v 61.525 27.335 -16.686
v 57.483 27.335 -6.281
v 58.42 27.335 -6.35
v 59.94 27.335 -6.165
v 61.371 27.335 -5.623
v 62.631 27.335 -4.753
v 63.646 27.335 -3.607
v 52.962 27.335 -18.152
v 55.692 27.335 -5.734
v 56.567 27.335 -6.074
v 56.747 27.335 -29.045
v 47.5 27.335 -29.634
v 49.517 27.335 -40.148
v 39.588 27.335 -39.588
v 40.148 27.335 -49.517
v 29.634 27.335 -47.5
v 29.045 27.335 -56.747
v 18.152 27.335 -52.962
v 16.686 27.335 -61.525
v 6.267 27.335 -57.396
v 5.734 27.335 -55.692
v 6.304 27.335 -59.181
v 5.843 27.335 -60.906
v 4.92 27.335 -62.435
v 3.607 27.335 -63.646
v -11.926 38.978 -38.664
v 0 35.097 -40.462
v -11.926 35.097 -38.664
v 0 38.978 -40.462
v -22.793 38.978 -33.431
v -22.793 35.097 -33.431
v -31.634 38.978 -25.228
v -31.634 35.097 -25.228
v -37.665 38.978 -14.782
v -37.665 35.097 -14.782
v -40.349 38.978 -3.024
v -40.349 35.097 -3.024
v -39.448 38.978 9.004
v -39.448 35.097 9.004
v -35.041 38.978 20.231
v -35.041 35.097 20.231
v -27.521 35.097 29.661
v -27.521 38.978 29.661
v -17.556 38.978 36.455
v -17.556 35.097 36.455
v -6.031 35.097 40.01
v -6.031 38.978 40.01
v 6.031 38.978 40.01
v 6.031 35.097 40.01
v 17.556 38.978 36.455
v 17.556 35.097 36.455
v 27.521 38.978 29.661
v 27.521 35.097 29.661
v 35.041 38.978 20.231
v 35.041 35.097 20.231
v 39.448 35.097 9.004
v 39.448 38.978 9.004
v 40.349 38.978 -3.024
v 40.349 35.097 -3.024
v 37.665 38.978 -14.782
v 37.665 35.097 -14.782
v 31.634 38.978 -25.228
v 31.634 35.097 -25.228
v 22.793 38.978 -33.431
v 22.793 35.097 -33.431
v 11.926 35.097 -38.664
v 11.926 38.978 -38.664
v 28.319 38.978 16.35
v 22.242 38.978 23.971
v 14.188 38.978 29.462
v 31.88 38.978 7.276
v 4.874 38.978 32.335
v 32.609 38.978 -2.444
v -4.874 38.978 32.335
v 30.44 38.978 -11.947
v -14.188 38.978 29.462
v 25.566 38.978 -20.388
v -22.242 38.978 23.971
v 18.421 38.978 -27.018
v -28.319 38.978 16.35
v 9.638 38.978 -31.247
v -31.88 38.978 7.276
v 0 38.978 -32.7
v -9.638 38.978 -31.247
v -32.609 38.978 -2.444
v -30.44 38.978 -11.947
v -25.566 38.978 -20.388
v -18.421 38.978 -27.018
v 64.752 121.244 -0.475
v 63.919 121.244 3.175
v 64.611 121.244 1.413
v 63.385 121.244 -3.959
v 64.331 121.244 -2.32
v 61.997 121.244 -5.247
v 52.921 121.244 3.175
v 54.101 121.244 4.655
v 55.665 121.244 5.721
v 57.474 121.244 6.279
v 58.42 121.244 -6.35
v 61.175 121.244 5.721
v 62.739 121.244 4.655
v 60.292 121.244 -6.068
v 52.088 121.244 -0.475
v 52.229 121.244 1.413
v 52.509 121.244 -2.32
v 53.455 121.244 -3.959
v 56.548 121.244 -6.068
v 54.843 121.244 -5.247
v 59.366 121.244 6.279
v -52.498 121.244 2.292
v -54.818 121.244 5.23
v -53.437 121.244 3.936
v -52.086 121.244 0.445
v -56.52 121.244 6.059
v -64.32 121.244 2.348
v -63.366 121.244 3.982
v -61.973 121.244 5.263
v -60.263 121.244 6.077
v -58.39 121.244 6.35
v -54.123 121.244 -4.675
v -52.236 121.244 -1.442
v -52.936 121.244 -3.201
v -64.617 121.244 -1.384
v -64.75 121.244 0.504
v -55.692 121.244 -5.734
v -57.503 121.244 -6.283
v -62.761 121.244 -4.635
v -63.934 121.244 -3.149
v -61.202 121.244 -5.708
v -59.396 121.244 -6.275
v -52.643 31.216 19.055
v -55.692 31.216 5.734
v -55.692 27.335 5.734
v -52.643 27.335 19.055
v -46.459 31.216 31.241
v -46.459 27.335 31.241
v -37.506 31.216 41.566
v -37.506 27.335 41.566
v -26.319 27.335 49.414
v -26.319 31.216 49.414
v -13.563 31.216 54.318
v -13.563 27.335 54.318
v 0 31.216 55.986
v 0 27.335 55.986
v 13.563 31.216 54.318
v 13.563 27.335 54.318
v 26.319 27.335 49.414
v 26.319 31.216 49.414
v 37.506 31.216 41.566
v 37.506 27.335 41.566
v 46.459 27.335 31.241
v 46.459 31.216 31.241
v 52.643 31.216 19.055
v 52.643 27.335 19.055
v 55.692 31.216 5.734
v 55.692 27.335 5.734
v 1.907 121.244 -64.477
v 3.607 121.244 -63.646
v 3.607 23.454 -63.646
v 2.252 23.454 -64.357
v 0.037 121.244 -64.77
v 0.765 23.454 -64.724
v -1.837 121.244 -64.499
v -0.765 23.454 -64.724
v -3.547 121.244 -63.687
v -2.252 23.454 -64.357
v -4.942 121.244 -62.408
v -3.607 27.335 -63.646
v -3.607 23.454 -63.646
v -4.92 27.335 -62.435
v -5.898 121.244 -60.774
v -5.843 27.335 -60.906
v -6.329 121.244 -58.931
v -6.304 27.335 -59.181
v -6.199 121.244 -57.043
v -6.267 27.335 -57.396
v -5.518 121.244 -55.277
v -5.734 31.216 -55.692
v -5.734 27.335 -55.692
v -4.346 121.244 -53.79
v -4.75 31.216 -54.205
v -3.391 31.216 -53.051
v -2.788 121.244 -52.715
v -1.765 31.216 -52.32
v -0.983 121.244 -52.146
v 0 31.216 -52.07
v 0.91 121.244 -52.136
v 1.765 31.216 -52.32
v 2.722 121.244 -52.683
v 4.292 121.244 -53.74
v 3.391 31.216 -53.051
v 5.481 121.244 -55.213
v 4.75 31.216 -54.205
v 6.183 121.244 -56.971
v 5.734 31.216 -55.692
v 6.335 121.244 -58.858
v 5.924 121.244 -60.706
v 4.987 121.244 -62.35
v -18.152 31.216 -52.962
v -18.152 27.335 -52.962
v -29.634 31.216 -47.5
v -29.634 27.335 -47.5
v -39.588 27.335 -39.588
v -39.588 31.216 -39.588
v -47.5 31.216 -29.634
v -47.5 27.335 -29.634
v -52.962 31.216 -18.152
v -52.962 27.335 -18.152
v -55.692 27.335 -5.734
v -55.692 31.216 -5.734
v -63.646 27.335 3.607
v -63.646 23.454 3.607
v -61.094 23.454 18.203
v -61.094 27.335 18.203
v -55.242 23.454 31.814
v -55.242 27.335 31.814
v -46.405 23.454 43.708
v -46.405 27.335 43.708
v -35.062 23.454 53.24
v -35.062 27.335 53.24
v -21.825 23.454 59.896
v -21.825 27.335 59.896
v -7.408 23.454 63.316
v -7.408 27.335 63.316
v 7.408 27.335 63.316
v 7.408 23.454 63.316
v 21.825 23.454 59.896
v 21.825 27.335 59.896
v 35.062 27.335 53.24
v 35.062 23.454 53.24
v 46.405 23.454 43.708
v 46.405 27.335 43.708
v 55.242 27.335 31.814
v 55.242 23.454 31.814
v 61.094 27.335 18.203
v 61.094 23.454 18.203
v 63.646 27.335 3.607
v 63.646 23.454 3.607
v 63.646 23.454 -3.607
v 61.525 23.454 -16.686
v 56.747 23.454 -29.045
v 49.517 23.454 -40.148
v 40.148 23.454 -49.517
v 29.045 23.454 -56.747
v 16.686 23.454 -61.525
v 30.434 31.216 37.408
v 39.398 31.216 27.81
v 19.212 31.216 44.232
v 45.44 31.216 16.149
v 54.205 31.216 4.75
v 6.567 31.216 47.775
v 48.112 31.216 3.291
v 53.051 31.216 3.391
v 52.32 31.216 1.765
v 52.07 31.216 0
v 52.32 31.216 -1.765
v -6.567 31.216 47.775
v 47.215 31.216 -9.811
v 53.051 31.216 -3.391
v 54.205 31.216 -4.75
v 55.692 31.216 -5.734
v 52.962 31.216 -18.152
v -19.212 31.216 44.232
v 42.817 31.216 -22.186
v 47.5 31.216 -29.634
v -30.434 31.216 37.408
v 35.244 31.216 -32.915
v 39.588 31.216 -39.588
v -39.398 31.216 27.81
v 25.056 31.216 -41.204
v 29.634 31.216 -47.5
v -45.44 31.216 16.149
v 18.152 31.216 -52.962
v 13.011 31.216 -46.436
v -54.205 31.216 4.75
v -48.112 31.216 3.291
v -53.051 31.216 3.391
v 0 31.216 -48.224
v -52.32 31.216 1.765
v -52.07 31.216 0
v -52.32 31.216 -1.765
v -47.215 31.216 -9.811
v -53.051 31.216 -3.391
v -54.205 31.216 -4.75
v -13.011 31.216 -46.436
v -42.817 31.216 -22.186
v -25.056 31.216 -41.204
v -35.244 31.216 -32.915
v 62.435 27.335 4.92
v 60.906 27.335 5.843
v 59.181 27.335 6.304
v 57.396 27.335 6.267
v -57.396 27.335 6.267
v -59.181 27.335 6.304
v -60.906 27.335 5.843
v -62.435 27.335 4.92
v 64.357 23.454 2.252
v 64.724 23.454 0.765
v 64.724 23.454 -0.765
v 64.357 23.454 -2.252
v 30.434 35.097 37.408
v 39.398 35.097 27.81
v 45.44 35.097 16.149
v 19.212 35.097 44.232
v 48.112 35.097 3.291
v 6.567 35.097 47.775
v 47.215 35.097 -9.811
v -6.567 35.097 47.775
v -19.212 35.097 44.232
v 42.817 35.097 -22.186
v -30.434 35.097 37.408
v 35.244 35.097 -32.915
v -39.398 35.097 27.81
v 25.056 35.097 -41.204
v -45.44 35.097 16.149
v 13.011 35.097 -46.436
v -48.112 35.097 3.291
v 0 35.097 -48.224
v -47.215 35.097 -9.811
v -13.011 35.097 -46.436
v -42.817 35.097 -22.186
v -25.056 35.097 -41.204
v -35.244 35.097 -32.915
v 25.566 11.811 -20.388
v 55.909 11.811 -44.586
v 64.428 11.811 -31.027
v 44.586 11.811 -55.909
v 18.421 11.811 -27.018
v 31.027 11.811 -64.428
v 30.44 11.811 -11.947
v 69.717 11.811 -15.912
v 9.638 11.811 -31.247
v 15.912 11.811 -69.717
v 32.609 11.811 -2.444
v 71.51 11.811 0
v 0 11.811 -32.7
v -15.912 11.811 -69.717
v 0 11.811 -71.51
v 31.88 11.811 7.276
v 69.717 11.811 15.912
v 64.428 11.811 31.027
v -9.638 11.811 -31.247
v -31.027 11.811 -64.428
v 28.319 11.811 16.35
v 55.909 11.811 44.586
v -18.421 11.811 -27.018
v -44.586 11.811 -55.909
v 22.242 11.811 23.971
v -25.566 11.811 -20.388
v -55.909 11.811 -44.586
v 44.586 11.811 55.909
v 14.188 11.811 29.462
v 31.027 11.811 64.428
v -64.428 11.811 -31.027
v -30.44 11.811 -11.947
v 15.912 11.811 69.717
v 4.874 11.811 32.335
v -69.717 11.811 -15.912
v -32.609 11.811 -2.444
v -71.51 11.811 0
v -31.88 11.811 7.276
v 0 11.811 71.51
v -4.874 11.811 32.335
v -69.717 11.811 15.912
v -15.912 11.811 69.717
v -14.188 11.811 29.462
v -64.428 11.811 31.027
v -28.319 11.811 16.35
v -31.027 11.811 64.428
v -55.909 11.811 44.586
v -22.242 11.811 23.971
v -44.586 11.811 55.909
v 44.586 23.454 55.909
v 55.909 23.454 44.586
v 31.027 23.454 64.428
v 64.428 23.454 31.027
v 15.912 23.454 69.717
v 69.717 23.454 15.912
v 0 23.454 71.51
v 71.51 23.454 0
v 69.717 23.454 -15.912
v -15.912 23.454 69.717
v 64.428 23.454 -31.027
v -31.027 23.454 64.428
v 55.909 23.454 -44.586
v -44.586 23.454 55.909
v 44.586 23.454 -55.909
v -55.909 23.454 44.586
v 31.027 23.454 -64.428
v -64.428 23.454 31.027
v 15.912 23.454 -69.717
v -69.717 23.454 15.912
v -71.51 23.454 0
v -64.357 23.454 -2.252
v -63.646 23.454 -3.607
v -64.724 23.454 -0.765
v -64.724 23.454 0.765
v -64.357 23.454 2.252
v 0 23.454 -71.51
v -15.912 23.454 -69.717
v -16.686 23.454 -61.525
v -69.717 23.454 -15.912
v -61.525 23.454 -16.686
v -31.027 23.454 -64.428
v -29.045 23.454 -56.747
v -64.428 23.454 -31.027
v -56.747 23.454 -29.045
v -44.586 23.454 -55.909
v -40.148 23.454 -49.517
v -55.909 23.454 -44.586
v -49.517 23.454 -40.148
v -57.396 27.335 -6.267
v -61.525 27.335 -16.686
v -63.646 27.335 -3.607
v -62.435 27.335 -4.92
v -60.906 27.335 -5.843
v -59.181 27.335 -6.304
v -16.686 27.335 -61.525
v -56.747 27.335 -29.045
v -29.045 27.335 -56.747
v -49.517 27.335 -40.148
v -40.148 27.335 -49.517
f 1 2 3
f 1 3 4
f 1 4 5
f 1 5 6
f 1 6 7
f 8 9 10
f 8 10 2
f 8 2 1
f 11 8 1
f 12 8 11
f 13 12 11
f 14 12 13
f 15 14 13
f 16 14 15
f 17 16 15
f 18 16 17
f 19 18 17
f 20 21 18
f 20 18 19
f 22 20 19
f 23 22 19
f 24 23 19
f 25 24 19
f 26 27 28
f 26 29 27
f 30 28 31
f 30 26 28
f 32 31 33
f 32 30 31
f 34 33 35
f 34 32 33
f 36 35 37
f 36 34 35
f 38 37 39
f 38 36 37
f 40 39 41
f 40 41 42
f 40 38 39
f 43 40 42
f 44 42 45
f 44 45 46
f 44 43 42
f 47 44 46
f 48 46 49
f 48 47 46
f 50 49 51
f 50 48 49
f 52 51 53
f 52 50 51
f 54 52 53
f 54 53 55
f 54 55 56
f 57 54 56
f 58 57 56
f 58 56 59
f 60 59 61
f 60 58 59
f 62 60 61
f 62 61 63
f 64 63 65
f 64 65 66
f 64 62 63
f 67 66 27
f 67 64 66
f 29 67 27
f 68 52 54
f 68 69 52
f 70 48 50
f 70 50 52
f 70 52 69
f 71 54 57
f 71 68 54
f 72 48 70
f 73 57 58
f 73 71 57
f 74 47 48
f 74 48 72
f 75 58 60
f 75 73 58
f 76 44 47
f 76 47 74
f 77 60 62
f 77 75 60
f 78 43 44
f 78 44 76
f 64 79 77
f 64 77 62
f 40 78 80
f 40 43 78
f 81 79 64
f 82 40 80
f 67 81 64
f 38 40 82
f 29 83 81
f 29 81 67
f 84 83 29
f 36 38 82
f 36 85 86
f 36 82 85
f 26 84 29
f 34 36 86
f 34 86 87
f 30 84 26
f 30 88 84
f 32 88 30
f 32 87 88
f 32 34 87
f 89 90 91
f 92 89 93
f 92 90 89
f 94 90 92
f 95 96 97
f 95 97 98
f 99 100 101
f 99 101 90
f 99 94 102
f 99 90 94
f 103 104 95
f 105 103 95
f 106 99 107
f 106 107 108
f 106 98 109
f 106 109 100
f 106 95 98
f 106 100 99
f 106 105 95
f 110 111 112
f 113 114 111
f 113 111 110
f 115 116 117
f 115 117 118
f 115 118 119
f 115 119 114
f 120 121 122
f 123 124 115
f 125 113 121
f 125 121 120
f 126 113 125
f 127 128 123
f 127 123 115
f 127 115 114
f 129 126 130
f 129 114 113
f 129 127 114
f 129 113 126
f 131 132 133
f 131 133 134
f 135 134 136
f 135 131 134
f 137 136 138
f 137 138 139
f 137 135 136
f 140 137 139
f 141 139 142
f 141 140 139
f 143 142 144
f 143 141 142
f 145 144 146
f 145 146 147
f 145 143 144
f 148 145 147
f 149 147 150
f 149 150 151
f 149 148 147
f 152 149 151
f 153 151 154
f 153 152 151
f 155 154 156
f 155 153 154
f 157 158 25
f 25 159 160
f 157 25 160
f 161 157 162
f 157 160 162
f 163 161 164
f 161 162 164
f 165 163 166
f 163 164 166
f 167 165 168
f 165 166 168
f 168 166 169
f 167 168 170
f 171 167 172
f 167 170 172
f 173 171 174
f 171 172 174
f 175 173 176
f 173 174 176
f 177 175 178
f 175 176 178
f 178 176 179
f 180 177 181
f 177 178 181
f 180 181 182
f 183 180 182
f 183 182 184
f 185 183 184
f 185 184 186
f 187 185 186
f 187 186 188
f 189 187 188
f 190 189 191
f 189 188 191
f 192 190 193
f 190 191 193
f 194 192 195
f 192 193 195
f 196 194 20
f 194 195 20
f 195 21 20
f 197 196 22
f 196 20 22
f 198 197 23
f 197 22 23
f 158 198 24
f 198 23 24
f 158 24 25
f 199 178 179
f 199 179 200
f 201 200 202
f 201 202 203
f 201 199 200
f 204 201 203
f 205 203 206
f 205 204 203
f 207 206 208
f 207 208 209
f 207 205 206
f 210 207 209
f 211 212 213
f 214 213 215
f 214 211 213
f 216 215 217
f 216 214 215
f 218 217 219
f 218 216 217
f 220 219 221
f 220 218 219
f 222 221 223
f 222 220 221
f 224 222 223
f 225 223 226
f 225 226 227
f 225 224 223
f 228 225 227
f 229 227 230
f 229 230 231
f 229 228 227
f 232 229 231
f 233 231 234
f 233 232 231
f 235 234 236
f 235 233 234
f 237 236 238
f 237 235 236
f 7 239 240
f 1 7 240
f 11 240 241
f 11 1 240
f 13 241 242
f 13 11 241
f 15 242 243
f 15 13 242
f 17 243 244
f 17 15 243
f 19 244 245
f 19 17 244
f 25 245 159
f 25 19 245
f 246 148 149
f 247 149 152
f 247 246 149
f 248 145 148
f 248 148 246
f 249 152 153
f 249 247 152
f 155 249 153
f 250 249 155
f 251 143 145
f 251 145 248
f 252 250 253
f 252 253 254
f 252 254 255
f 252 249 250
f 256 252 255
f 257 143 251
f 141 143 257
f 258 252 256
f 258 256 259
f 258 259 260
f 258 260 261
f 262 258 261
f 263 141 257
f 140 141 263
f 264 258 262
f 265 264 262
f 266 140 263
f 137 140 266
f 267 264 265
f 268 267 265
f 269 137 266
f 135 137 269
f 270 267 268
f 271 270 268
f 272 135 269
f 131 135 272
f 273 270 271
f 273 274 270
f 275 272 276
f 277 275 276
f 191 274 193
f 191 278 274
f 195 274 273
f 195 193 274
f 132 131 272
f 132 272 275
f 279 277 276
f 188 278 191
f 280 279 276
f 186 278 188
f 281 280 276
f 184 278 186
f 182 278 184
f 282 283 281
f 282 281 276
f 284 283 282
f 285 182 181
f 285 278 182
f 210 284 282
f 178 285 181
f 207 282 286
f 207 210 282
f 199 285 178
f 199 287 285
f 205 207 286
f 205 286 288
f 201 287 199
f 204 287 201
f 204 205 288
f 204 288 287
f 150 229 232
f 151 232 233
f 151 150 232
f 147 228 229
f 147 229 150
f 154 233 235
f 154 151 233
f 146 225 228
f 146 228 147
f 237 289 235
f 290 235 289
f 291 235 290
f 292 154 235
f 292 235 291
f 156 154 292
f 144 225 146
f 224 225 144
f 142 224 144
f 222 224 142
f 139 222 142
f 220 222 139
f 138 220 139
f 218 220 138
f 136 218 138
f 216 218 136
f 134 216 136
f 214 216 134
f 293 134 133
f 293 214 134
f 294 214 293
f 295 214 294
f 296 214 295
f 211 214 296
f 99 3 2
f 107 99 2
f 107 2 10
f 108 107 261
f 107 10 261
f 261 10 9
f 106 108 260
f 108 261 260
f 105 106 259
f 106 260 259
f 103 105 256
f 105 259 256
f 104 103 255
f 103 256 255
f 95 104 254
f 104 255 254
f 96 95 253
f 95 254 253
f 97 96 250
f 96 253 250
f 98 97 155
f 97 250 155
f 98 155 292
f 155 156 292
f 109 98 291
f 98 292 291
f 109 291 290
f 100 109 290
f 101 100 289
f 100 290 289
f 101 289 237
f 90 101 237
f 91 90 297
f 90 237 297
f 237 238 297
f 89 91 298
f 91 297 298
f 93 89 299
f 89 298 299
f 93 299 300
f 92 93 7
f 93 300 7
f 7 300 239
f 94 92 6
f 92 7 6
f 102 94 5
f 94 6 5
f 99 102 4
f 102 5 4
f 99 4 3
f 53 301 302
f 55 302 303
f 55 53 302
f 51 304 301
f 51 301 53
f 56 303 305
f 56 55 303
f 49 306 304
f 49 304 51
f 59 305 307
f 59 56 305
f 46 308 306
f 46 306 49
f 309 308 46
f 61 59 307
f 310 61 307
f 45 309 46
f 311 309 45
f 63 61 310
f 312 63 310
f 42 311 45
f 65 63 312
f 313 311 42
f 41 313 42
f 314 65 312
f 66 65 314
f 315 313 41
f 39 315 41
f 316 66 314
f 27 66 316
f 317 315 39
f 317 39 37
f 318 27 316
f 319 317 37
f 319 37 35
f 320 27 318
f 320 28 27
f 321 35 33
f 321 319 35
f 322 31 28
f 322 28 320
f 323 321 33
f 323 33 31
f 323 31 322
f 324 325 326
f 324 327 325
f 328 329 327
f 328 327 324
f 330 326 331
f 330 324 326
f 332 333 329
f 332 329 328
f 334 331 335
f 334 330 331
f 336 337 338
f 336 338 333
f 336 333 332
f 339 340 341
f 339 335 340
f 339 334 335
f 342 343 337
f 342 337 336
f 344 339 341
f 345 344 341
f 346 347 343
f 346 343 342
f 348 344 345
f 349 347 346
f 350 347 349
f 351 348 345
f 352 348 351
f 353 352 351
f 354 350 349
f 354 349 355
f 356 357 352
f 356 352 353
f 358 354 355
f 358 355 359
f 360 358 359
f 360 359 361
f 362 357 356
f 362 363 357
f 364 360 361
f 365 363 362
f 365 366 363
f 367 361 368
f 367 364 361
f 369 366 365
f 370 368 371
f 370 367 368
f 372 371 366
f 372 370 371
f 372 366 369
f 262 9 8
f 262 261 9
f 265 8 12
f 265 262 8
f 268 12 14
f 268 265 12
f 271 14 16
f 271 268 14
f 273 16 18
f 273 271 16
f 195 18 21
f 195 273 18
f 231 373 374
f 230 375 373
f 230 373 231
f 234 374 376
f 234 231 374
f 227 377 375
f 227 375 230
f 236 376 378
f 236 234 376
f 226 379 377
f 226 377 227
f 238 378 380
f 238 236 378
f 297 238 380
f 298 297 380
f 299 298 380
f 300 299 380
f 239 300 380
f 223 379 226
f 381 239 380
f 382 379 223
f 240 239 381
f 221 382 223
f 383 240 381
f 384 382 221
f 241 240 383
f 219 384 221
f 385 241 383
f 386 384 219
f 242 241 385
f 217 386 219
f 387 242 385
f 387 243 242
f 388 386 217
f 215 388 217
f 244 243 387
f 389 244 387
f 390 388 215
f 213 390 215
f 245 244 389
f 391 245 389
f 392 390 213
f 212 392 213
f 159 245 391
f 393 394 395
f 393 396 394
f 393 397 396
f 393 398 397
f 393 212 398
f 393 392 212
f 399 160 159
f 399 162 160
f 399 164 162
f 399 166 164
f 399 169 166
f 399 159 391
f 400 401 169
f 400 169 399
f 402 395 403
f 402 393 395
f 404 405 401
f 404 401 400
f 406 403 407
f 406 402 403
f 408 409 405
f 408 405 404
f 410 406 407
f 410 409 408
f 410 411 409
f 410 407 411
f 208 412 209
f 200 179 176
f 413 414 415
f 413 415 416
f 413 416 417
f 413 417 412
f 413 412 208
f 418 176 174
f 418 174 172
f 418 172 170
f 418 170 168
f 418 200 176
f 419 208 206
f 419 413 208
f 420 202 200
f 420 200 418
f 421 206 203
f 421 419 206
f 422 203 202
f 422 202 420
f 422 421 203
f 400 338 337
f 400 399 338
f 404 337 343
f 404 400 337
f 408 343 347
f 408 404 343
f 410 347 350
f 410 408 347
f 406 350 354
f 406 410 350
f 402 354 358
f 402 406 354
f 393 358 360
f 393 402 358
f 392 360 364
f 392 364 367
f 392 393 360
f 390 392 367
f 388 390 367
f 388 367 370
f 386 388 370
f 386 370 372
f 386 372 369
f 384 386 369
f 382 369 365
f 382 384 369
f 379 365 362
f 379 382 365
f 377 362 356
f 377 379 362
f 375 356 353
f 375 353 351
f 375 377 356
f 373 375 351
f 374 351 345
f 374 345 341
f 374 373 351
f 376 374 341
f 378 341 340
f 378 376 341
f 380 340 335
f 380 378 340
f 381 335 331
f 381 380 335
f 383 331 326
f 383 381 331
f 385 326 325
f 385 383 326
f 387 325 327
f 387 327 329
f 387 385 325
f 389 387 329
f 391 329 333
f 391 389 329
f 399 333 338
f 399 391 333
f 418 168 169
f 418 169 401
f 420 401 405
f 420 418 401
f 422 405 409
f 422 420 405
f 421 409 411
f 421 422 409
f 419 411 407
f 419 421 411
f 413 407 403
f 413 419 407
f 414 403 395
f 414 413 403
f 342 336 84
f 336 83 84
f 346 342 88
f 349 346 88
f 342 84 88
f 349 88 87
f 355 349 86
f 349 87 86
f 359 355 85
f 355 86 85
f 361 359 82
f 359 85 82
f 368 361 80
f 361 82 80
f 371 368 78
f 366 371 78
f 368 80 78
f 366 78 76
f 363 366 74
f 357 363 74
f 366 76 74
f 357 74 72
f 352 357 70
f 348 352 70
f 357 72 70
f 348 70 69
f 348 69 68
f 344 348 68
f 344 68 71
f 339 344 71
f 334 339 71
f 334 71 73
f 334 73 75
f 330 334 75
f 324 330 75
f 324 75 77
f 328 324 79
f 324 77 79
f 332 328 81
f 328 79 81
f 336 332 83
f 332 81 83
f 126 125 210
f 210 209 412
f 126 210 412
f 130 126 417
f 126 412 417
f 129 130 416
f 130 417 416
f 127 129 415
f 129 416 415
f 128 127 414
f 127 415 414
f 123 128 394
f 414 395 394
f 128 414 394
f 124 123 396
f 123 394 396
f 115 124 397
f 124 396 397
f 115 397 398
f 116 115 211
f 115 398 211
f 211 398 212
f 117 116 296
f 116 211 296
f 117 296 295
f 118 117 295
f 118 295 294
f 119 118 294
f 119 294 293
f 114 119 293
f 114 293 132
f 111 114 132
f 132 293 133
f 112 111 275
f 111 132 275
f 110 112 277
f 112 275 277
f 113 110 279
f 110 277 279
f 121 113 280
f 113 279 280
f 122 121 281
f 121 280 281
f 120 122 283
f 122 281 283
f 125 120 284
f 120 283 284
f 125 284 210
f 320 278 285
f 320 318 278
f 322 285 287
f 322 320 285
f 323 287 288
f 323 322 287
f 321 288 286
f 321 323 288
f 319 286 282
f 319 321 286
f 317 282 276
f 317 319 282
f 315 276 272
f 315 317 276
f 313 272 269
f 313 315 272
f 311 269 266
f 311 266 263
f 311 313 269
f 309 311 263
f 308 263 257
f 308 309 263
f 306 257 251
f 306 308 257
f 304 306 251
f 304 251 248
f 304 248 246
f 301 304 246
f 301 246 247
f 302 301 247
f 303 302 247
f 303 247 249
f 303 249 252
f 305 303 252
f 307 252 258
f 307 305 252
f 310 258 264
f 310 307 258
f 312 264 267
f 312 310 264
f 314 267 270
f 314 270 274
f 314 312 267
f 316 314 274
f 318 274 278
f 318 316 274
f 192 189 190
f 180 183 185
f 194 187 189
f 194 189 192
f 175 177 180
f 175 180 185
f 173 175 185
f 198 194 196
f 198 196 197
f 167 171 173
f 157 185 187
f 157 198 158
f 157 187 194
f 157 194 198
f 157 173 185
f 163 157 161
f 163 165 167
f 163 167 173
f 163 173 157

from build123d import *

# Parameters (mm, degrees)
SKETCH8_R      = 6.35
EXTRUDE1_DEPTH = 97.79


with BuildPart() as part:
    # Sketch1 → Revolve1 (revolve)
    with BuildSketch(Plane.XY):
        Polygon((-48.22399997, 35.097050796), (-40.462, 35.097050796), (-40.462, 38.978050908), (-32.7, 38.978050908), (-32.7, 35.097050796), (-32.7, 11.811050572), (-71.50999988, 11.811050572), (-71.50999988, 23.454050572), (-63.74799991, 23.454050572), (-63.74799991, 27.335050572), (-55.98599994, 27.335050572), (-55.98599994, 31.216050684), (-48.22399997, 31.216050684), align=None)
    revolve(axis=Axis((0, 0, 0), (0, 1, 0)))

    # Sketch8 → Extrude1 (add)
    with BuildSketch(Plane(origin=(0, 23.454050572, 0), x_dir=(1, 0, 0), z_dir=(0, 1, 0))):
        with Locations((-58.42, 0)):
            Circle(SKETCH8_R)
        with Locations((58.42, 0)):
            Circle(SKETCH8_R)
        with Locations((0, 58.42)):
            Circle(SKETCH8_R)
    extrude(amount=EXTRUDE1_DEPTH)


solid = part.part
